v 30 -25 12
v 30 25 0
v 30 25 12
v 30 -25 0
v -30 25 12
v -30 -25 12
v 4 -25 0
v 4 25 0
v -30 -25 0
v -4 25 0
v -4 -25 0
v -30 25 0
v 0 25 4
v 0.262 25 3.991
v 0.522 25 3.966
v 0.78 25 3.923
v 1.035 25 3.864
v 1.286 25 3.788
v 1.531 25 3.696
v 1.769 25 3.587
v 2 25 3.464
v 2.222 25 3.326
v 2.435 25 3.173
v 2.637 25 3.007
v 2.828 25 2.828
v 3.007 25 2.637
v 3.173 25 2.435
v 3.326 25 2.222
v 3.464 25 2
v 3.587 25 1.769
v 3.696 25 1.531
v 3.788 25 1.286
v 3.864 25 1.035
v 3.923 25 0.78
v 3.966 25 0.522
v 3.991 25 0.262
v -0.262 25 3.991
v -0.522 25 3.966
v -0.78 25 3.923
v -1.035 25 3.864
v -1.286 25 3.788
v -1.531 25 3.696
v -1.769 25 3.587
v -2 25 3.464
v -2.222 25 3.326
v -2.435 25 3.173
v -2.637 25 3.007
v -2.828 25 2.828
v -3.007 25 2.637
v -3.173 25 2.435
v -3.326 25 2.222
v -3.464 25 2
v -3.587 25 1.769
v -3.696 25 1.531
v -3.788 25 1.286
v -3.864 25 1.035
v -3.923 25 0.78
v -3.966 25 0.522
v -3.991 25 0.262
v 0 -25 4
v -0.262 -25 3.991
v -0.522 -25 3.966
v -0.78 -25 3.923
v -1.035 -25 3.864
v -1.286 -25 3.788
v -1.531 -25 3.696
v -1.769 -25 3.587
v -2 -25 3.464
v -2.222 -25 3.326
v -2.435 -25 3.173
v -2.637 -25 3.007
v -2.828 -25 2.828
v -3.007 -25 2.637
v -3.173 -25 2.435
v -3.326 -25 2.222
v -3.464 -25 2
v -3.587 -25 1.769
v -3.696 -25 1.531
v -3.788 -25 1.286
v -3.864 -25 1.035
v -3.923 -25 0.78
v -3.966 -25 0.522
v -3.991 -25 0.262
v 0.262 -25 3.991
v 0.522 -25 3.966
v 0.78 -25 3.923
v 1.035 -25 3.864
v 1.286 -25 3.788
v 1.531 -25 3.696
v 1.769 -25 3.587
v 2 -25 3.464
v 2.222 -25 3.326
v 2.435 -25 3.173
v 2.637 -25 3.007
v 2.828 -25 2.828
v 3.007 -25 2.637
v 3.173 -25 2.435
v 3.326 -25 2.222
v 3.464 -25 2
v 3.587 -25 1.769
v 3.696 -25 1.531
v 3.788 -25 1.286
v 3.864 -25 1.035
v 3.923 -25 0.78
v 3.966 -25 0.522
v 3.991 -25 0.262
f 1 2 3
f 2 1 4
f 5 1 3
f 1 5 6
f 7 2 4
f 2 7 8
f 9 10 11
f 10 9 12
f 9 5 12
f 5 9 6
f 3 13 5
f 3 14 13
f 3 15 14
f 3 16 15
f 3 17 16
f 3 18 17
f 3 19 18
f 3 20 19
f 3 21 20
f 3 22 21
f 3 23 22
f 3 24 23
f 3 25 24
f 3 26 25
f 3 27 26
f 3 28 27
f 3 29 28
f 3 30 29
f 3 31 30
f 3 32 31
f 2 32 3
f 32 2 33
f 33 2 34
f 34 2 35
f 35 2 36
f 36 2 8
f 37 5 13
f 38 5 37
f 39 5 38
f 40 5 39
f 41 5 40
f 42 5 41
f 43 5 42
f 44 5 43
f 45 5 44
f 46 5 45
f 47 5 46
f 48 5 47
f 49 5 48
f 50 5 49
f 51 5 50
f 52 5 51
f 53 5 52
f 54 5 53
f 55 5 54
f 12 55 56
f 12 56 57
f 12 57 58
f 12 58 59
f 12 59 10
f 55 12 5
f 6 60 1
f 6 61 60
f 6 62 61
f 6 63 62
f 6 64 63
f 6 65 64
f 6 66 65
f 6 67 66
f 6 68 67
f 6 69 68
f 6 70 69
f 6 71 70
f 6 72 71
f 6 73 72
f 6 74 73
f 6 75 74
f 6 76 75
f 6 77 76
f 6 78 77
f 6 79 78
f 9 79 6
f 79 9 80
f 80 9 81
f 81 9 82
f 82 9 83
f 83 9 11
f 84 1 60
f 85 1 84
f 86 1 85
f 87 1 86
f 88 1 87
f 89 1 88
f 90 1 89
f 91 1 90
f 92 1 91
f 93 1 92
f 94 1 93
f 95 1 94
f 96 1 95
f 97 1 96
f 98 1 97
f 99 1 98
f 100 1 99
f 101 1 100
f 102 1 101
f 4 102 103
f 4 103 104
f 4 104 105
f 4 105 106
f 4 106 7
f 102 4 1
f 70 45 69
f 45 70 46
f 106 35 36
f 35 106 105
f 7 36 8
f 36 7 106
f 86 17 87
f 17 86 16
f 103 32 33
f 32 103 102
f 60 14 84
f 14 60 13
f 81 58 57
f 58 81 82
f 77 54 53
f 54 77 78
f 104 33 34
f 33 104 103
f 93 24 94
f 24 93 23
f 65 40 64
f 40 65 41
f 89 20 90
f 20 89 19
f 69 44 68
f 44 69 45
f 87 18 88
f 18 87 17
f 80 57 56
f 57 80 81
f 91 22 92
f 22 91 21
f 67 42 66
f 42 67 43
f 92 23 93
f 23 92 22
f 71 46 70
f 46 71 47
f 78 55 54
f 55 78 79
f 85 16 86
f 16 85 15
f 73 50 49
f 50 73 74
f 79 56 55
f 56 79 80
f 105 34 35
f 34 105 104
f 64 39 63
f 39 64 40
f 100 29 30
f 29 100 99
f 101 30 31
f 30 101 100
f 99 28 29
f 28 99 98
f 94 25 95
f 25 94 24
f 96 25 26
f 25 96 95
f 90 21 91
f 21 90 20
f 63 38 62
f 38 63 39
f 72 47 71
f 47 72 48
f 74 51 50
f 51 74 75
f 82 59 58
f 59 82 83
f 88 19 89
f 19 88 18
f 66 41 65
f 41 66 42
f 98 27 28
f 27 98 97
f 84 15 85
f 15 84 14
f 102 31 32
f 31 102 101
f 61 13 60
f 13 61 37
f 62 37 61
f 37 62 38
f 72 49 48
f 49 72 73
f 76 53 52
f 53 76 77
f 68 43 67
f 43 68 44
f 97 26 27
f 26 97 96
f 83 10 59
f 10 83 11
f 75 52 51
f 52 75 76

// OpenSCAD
// Cable bridge - lets cables cross under a bench mat
// Print orientation: flat on bed, tunnel opening at floor level

$fn = 96;               // resolution for curved surfaces

// --- Block dimensions ---
block_len   = 60;       // length along X (mm)
block_wid   = 50;       // width along Y (mm)
block_h     = 12;       // height along Z (mm)

// --- Tunnel dimensions ---
tunnel_d    = 8;        // tunnel cylinder diameter (mm)
tunnel_x    = 0;        // tunnel axis X position (mm)
tunnel_z    = 0;        // tunnel axis Z position (floor level) (mm)

// --- Cutting clearance ---
eps         = 0.5;      // overshoot past cut faces (mm)

difference() {
    // Main block, centred in X/Y, sitting on z = 0
    translate([-block_len/2, -block_wid/2, 0])
        cube([block_len, block_wid, block_h]);

    // Semicircular tunnel: cylinder along Y with axis at floor level.
    // The lower half lies below z = 0, leaving a half-round channel.
    translate([tunnel_x, 0, tunnel_z])
        rotate([90, 0, 0])
            cylinder(d = tunnel_d, h = block_wid + 2*eps, center = true);
}
